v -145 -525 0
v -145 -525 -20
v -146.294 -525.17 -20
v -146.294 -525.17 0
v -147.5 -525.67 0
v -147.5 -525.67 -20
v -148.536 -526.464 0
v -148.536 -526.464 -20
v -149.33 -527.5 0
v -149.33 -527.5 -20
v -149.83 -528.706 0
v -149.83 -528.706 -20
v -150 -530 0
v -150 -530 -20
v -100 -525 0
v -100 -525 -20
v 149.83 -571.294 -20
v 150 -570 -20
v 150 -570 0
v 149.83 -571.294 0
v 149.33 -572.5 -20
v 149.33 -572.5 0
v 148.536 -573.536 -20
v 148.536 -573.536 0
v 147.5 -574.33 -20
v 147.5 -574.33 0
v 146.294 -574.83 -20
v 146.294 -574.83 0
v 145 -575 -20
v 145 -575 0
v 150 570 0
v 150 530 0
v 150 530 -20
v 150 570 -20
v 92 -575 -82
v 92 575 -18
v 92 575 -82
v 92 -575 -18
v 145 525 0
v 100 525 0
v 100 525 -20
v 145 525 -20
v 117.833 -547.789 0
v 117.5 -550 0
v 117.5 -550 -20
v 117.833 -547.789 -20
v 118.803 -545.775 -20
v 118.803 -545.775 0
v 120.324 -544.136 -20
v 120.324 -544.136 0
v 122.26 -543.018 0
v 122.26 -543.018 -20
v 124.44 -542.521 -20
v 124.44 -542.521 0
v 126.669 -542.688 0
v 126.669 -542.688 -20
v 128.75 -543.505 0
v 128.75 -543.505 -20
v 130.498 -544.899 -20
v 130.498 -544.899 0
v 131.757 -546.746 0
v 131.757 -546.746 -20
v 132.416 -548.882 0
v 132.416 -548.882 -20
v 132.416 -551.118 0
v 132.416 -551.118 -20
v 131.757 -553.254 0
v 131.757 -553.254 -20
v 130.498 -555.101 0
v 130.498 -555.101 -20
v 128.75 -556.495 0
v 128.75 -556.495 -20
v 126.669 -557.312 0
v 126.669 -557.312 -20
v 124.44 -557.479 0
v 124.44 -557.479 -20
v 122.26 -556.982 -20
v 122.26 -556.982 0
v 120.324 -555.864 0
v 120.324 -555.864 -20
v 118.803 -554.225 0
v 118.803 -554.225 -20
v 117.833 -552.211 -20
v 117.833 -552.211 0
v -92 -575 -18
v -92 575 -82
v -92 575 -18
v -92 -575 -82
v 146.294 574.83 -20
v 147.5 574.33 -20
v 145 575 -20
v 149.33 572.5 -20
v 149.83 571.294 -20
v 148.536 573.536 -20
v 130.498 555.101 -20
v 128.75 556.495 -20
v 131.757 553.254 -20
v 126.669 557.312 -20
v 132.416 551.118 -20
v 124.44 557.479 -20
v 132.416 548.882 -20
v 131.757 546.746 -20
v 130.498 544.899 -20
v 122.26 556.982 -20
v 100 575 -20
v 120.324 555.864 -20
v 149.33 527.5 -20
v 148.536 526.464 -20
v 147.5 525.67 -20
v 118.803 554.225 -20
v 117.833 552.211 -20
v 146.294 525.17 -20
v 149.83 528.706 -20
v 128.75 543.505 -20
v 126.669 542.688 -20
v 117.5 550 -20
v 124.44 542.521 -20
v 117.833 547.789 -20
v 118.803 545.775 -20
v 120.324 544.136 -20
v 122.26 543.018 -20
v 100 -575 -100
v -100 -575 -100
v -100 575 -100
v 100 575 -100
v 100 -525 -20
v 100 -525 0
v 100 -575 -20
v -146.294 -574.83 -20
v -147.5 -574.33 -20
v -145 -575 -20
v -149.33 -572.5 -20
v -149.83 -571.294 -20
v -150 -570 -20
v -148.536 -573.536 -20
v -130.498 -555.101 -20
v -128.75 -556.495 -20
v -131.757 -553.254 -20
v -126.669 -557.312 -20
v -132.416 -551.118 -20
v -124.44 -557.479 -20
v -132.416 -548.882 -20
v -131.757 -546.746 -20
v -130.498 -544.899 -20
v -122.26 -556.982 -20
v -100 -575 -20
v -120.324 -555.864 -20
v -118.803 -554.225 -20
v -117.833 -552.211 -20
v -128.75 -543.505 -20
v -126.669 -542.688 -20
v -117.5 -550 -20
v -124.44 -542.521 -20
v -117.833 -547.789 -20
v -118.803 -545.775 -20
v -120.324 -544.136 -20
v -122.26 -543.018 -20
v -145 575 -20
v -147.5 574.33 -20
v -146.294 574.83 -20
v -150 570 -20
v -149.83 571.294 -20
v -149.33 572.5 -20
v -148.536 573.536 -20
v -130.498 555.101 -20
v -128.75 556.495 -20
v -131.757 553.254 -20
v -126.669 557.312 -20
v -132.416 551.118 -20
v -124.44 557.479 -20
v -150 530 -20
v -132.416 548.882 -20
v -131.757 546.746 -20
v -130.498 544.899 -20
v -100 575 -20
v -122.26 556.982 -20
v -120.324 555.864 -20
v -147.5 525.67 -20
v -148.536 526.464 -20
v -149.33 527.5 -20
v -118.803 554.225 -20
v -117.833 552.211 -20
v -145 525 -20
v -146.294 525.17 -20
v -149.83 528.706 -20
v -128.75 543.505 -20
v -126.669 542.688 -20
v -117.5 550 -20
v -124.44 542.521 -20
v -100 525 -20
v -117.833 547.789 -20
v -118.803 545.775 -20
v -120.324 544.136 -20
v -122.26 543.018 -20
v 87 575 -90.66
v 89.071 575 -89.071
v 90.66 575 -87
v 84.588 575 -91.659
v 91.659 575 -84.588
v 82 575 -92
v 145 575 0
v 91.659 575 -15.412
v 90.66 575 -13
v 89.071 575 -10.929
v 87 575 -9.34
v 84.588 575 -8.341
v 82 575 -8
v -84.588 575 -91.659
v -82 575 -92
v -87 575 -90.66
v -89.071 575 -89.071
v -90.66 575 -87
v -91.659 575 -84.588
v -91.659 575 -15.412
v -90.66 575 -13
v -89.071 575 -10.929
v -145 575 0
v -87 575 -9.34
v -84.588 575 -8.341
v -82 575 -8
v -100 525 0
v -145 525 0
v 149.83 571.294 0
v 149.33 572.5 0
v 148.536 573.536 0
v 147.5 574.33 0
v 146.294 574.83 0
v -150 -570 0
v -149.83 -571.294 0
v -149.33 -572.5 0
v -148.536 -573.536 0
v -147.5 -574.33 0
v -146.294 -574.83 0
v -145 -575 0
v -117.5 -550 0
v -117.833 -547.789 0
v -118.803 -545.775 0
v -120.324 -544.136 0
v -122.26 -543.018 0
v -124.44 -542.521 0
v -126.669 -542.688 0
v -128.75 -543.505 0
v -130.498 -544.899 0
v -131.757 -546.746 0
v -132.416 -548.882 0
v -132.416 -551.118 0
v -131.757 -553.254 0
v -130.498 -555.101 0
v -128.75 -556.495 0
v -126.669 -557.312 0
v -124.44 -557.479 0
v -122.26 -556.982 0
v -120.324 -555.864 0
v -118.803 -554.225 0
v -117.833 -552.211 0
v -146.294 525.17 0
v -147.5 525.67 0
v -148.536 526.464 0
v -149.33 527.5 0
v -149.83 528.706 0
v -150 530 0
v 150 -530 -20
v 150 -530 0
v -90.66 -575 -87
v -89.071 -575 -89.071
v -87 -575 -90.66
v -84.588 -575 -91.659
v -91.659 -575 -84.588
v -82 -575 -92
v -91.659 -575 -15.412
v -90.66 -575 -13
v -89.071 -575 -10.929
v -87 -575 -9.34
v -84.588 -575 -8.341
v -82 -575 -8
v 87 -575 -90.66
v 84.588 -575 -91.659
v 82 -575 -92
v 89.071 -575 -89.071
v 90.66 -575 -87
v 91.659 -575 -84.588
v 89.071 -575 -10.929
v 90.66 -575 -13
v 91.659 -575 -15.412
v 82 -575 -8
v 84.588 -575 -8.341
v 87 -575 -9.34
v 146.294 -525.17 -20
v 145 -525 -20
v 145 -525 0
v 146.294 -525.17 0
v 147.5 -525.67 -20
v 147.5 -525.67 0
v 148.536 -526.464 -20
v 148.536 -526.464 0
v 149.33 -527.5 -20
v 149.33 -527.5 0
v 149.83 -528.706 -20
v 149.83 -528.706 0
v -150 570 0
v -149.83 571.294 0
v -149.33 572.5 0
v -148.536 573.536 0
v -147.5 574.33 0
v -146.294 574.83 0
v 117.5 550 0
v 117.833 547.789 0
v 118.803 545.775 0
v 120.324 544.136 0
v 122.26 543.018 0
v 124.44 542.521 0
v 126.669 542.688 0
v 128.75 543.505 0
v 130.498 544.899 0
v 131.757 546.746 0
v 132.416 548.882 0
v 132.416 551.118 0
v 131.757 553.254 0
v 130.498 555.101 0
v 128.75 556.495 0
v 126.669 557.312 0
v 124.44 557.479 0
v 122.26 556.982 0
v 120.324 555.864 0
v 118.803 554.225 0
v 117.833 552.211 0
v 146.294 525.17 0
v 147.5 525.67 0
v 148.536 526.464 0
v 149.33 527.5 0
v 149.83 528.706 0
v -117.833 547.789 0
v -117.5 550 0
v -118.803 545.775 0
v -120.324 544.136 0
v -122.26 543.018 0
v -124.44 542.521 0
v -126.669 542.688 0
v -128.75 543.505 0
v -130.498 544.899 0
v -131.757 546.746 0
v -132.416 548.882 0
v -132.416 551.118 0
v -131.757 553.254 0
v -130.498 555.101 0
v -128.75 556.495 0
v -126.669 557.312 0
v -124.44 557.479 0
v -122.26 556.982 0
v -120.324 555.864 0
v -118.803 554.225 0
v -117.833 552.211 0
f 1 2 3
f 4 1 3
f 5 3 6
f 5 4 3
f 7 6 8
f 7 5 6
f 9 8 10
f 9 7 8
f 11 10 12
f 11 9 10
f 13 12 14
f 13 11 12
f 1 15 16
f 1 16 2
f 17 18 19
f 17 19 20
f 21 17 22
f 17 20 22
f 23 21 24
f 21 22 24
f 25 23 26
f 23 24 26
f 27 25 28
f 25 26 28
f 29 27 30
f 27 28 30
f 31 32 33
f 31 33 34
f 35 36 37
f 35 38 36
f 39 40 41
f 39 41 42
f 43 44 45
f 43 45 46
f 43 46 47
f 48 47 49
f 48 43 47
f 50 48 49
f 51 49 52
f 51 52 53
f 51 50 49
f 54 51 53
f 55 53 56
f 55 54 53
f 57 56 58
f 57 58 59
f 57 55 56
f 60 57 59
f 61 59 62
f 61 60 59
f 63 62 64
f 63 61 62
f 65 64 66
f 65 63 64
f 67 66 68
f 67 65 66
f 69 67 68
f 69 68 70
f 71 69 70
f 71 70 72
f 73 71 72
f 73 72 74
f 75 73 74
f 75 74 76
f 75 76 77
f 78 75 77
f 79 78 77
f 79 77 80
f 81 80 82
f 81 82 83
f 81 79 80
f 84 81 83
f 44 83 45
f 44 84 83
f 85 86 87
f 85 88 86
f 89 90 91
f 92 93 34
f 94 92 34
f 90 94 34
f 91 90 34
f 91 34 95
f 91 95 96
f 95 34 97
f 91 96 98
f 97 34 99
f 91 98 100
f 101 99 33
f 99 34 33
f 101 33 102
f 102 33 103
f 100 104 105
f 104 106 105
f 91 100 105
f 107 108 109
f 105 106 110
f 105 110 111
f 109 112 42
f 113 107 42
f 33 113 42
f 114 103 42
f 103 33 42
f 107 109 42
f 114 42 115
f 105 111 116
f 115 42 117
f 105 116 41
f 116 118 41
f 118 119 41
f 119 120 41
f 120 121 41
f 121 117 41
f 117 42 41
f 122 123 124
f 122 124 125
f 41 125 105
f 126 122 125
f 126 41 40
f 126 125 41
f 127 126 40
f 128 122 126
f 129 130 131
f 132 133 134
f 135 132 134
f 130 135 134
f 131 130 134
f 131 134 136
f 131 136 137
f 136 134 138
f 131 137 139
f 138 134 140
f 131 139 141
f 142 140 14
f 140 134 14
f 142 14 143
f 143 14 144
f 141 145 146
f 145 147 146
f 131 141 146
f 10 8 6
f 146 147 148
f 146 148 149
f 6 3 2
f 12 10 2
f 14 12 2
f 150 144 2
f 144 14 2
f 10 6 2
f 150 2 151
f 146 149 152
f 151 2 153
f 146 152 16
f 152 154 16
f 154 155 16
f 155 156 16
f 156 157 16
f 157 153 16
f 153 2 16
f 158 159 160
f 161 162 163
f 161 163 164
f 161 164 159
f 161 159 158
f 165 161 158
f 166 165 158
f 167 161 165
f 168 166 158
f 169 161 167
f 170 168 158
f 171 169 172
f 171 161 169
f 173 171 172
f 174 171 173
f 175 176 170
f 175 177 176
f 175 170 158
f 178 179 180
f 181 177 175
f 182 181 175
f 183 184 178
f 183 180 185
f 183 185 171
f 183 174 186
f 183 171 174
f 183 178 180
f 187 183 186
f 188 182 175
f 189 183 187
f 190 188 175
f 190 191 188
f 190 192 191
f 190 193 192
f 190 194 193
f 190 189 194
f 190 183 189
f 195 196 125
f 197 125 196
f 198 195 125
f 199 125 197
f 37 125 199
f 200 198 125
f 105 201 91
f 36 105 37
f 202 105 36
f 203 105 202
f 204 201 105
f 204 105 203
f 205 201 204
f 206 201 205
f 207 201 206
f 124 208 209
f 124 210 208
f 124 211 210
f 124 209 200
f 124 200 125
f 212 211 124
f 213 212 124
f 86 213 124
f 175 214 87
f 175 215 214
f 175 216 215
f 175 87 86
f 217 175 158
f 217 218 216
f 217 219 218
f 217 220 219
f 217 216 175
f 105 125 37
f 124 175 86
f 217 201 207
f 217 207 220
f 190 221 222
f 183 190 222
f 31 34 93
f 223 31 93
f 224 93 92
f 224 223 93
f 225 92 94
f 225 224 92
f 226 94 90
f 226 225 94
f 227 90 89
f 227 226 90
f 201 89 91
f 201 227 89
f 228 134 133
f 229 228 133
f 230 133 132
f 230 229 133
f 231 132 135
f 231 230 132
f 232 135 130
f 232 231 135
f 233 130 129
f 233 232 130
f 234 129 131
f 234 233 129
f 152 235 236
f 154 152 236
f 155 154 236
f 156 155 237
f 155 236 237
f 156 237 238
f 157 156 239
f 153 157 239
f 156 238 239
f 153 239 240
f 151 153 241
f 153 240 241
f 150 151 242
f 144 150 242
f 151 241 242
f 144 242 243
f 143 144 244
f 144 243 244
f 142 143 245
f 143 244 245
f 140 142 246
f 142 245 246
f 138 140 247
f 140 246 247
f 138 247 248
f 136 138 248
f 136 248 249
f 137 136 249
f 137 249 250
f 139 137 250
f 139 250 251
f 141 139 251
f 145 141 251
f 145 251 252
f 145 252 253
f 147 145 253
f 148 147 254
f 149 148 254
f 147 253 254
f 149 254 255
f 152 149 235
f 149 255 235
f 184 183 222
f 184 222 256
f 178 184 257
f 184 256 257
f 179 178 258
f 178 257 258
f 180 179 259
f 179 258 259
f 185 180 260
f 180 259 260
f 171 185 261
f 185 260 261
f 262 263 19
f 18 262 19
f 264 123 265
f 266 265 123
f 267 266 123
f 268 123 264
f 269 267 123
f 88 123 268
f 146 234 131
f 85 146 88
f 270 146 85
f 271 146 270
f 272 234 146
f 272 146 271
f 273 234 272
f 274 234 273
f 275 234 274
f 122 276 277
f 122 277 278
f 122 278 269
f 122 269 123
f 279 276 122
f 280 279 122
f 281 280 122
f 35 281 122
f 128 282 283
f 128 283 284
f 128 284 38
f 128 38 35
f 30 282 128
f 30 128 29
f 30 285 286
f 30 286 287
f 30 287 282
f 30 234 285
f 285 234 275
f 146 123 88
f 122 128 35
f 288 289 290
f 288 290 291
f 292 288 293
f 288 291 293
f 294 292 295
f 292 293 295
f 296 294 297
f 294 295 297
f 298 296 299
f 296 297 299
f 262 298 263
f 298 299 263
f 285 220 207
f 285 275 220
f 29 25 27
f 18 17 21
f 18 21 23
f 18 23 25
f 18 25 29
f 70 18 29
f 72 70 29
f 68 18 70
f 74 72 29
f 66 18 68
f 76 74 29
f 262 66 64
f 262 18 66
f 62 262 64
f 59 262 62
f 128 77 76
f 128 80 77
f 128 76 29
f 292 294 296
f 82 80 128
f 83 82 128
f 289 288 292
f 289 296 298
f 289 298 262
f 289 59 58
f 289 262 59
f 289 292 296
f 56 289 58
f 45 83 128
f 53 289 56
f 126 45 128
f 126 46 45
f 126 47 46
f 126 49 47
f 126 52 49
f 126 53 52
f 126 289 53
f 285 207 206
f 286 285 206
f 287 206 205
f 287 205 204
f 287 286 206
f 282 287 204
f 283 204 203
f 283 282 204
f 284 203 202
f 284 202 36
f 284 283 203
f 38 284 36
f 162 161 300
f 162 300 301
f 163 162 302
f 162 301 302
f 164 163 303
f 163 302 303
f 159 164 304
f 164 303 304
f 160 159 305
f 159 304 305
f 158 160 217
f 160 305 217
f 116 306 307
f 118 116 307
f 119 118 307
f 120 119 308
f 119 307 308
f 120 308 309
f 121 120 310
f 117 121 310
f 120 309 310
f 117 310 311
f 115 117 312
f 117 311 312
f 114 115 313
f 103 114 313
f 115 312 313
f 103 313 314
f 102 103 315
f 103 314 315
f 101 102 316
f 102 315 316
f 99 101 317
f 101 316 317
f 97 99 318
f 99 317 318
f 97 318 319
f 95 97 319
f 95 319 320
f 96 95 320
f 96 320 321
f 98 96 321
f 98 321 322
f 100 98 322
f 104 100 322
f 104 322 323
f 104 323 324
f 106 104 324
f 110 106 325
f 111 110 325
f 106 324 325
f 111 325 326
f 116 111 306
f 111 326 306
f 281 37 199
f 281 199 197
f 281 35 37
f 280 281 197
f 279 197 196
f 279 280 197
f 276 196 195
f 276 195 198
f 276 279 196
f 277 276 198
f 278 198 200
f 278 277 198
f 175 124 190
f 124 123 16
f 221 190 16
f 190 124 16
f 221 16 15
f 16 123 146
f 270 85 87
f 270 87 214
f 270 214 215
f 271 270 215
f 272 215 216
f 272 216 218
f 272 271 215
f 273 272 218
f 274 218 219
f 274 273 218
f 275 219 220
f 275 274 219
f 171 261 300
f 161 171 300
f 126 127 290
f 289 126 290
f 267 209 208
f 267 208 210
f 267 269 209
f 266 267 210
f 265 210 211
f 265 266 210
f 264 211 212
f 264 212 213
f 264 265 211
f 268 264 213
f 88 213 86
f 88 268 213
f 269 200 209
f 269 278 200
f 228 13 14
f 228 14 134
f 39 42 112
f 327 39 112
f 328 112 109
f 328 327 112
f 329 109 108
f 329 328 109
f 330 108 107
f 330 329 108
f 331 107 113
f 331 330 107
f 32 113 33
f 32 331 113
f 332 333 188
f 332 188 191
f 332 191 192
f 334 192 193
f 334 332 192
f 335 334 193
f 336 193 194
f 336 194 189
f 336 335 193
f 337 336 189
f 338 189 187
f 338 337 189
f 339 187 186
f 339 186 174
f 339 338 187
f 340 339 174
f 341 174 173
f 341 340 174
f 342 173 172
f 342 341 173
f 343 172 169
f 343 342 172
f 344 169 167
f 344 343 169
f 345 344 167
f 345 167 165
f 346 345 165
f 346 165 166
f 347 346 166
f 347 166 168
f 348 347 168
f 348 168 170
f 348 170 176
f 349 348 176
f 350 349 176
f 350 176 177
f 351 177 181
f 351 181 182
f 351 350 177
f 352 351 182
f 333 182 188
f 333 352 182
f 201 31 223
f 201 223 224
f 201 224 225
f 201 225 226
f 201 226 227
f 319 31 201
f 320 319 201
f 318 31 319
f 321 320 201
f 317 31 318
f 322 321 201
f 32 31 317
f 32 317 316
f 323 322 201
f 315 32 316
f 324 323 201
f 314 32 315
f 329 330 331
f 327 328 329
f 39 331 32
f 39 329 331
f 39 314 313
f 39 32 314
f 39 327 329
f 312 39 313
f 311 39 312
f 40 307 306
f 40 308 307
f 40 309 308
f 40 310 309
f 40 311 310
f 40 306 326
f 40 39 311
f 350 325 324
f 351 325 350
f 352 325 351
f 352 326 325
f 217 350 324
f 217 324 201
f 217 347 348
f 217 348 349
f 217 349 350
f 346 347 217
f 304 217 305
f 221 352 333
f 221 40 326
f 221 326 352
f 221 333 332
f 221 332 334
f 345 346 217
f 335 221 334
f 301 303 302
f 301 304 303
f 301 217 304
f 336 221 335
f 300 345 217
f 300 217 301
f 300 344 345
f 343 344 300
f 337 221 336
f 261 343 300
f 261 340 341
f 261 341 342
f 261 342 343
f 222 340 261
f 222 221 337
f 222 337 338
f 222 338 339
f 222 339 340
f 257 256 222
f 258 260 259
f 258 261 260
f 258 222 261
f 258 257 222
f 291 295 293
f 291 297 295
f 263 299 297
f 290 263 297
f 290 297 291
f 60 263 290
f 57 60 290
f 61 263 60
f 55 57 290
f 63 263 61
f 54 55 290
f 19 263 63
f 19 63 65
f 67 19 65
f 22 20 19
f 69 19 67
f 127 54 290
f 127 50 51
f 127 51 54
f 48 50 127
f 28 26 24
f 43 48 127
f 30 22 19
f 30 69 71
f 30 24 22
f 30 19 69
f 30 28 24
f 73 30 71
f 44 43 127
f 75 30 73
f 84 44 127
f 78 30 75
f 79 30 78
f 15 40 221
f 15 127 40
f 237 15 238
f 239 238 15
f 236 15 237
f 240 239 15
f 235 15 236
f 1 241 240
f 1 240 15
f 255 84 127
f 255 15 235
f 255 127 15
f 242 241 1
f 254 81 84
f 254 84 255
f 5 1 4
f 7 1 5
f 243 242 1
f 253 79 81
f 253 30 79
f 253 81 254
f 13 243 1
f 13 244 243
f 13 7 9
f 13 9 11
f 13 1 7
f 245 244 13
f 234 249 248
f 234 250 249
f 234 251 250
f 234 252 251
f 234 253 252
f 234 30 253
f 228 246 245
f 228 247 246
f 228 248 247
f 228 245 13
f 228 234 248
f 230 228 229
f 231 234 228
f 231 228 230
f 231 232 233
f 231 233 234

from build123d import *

# Parameters (mm, degrees)
F0_W     = 200
F0_H     = 100
F1_DEPTH = 575
F2_R     = 7.5
F3_DEPTH = 20


with BuildPart() as f1:
    # F0 (on Front) → F1 (new body, symmetric)
    with BuildSketch(Plane.XZ):
        with Locations((0, -50)):
            Rectangle(F0_W, F0_H)
        with BuildLine():
            ThreePointArc((-92, -18), (-89.0710678119, -10.9289321881), (-82, -8))
            Line((-82, -8), (82, -8))
            ThreePointArc((82, -8), (89.0710678119, -10.9289321881), (92, -18))
            Line((92, -18), (92, -82))
            ThreePointArc((92, -82), (89.0710678119, -89.0710678119), (82, -92))
            Line((82, -92), (-82, -92))
            ThreePointArc((-82, -92), (-89.0710678119, -89.0710678119), (-92, -82))
            Line((-92, -82), (-92, -18))
        make_face(mode=Mode.SUBTRACT)
    extrude(amount=F1_DEPTH, both=True)

    # F2 (on face) → F3 (join)
    with BuildSketch(Plane.XY):
        with BuildLine():
            Line((-145, -575), (-100, -575))
            Line((-100, -575), (-100, -525))
            Line((-100, -525), (-145, -525))
            ThreePointArc((-145, -525), (-148.5355339059, -526.4644660941), (-150, -530))
            Line((-150, -530), (-150, -570))
            ThreePointArc((-150, -570), (-148.5355339059, -573.5355339059), (-145, -575))
        make_face()
        with Locations((-125, -550)):
            Circle(F2_R, mode=Mode.SUBTRACT)
    extrude(amount=-F3_DEPTH)

    # F4: F1 across plane


with BuildPart() as f1_1:
    add(f1.part)
    add(f1.part.mirror(Plane.XZ))

    # F5: F1 across plane


with BuildPart() as f1_2:
    add(f1_1.part)
    add(f1_1.part.mirror(Plane.YZ))


solid = f1_2.part
